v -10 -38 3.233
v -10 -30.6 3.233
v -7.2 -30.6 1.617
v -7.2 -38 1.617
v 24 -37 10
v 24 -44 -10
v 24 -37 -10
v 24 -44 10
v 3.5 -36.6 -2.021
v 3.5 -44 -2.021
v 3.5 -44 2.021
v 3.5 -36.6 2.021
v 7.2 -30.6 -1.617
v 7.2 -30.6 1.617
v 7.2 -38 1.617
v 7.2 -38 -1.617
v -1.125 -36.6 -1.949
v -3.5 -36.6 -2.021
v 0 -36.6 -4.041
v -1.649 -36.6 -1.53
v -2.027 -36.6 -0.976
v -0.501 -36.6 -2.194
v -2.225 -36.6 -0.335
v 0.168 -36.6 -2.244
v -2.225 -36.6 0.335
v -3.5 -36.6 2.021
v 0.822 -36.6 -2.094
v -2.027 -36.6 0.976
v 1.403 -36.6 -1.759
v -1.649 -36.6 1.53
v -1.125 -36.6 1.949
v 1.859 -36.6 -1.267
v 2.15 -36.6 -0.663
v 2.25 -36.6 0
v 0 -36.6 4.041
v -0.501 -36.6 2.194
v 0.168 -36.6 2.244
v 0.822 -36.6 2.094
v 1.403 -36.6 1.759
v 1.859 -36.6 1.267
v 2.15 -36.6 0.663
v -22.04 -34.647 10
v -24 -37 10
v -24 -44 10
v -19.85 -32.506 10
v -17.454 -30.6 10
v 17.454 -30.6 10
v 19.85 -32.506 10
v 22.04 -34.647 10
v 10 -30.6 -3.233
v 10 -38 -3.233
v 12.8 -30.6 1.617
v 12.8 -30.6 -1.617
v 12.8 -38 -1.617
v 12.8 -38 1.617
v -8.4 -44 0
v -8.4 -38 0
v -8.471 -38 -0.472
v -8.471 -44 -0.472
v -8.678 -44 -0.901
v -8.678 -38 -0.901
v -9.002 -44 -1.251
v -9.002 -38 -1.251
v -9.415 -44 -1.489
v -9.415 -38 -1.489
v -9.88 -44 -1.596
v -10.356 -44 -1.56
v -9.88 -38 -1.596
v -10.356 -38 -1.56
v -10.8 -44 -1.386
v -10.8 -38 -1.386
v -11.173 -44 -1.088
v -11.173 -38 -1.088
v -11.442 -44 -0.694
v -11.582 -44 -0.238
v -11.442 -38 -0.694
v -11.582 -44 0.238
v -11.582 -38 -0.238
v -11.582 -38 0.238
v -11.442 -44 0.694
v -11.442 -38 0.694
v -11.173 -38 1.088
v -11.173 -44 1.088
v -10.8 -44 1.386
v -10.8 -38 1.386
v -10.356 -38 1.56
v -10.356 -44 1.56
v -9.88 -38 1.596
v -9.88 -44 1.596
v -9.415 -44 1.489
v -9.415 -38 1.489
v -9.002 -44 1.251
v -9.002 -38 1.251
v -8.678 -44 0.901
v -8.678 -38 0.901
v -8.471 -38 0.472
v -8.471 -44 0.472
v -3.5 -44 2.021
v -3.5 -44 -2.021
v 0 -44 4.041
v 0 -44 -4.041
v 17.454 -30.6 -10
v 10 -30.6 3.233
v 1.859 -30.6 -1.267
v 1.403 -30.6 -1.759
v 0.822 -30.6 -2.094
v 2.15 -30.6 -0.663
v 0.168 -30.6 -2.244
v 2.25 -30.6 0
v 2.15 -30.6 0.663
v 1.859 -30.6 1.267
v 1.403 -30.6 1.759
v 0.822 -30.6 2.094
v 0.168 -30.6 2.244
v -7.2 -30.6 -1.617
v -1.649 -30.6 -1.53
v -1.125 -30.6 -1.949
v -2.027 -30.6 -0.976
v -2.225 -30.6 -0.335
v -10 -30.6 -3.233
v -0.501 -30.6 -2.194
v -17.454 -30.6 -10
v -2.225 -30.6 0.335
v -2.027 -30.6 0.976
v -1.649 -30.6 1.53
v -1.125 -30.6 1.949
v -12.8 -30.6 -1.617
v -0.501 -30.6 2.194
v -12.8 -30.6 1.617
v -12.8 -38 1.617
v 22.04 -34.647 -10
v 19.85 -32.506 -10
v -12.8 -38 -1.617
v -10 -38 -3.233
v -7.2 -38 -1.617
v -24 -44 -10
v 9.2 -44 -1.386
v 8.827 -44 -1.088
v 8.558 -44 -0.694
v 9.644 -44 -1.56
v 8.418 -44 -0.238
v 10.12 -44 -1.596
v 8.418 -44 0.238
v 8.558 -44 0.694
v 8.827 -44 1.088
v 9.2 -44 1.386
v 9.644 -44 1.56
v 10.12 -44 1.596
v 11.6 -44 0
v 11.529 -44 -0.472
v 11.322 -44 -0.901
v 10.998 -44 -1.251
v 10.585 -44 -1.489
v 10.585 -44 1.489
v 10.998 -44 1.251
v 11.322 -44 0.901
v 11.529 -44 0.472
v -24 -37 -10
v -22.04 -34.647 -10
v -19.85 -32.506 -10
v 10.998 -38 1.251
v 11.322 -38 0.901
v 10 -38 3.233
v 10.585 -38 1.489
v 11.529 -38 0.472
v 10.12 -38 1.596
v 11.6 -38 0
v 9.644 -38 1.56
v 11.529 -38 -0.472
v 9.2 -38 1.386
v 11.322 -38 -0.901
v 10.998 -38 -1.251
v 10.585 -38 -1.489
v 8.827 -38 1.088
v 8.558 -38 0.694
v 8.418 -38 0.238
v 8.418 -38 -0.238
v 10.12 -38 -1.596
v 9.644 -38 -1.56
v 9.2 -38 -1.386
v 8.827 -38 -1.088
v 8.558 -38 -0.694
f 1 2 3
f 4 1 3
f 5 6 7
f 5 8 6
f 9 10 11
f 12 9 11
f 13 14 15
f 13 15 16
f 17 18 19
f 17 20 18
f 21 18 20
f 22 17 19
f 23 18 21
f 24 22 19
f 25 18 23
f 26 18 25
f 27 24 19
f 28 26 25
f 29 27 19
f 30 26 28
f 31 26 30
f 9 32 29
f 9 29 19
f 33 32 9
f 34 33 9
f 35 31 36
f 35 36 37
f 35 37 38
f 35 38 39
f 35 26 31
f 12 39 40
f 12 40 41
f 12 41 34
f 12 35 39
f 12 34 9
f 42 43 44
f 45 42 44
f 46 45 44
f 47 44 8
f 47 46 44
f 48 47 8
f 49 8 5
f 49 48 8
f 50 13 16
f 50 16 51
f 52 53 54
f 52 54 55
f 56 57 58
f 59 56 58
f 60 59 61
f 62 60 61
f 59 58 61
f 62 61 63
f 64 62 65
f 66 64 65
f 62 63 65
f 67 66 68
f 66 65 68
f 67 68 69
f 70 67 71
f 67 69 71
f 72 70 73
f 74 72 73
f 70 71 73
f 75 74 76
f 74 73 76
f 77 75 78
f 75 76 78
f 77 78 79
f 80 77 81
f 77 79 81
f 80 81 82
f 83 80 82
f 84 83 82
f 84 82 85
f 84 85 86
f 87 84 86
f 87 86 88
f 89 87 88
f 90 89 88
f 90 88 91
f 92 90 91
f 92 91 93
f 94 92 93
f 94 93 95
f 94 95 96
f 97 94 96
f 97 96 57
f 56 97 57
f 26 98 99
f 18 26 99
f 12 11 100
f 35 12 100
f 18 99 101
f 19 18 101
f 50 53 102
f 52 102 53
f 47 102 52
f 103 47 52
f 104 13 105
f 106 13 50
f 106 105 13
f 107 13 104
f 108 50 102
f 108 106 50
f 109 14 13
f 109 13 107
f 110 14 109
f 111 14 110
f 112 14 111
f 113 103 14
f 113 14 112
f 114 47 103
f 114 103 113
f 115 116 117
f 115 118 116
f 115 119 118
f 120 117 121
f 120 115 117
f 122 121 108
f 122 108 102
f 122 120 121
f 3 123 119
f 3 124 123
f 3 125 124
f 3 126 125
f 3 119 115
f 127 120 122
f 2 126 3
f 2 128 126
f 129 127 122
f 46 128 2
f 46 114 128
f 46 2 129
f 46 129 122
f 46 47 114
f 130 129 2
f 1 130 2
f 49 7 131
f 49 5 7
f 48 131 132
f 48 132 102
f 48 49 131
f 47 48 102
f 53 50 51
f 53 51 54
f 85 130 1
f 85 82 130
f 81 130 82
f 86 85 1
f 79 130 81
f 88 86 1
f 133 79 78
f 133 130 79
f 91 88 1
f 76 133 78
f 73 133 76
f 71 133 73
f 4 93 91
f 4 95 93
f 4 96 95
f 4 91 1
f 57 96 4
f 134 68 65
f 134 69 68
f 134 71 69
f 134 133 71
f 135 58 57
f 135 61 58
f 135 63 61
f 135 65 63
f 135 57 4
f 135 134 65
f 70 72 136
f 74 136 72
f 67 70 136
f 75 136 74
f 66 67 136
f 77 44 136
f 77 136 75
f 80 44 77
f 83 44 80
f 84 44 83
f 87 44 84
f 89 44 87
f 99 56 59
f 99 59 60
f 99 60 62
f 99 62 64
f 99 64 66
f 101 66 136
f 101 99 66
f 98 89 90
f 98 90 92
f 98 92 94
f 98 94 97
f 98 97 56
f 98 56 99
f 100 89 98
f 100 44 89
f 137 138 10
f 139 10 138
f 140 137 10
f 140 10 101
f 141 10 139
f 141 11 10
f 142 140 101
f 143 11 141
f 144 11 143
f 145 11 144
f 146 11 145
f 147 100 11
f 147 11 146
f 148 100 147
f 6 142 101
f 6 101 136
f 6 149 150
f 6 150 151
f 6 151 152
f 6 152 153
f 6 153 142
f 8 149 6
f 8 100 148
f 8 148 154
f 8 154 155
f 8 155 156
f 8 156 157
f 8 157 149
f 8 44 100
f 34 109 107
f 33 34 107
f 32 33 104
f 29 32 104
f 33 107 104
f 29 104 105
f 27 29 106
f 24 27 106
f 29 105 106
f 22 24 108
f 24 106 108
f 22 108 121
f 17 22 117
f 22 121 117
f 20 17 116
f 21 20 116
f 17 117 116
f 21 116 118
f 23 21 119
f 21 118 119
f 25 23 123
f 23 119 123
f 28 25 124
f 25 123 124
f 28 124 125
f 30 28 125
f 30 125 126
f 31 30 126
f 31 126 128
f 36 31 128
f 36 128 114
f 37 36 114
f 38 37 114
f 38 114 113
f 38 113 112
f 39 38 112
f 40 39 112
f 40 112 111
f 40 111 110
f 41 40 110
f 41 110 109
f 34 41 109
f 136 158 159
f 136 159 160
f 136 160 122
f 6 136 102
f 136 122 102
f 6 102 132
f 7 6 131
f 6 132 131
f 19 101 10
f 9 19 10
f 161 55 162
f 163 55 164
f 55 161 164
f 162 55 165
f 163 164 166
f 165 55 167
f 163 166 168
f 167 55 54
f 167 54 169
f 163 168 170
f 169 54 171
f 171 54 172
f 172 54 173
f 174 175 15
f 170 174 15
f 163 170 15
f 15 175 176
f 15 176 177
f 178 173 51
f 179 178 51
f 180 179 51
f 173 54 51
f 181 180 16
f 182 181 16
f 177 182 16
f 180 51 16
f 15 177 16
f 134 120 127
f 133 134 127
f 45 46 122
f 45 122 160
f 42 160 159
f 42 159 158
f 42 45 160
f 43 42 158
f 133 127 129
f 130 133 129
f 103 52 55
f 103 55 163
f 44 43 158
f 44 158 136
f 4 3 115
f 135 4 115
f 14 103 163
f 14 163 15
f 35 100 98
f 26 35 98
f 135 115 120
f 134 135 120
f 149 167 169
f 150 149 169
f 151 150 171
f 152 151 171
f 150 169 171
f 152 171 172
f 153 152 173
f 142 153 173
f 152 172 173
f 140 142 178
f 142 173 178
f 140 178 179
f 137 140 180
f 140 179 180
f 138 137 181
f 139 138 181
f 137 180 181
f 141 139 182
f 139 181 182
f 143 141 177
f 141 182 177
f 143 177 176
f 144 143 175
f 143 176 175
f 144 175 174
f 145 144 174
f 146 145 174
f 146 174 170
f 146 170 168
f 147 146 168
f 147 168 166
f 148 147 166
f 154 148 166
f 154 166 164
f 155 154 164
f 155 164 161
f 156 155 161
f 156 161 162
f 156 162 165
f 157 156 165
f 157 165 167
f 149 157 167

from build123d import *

# Parameters (mm, degrees)
BOSS_EXTRUDE1_DEPTH = 10
CUT_EXTRUDE1_REACH  = 15.4
SKETCH2_R           = 2.25
SKETCH2_R_2         = 1.6
CUT_EXTRUDE2_DEPTH  = 7.4
CUT_EXTRUDE3_DEPTH  = 7.4


with BuildPart() as part:
    # Sketch1 → Boss-Extrude1 (new body, symmetric)
    with BuildSketch(Plane.XY):
        with BuildLine():
            Line((17.453939383, -30.6), (-17.453939383, -30.6))
            ThreePointArc((-17.453939383, -30.6), (-20.972536151, -33.54882923), (-24, -37))
            Line((-24, -37), (-24, -44))
            Line((-24, -44), (24, -44))
            Line((24, -44), (24, -37))
            ThreePointArc((24, -37), (20.972536151, -33.54882923), (17.453939383, -30.6))
        make_face()
    extrude(amount=BOSS_EXTRUDE1_DEPTH, both=True)

    # Sketch2 → Cut-Extrude1 (cut, up to next)
    with BuildSketch(Plane(origin=(0, -30.6, 0), x_dir=(1, 0, 0), z_dir=(0, 1, 0)), mode=Mode.PRIVATE) as cut_extrude1_sk1:
        Circle(SKETCH2_R)
    cut_extrude1_tool1 = extrude(cut_extrude1_sk1.sketch, amount=-CUT_EXTRUDE1_REACH, mode=Mode.PRIVATE) & part.part
    add(cut_extrude1_tool1.solids().sort_by_distance((0, -30.6, 0))[0], mode=Mode.SUBTRACT)
    # Sketch2 → Cut-Extrude1 (cut, up to next)
    with BuildSketch(Plane(origin=(0, -30.6, 0), x_dir=(1, 0, 0), z_dir=(0, 1, 0)), mode=Mode.PRIVATE) as cut_extrude1_sk2:
        with Locations((-10, 0)):
            Circle(SKETCH2_R_2)
    cut_extrude1_tool2 = extrude(cut_extrude1_sk2.sketch, amount=-CUT_EXTRUDE1_REACH, mode=Mode.PRIVATE) & part.part
    add(cut_extrude1_tool2.solids().sort_by_distance((-10, -30.6, 0))[0], mode=Mode.SUBTRACT)
    # Sketch2 → Cut-Extrude1 (cut, up to next)
    with BuildSketch(Plane(origin=(0, -30.6, 0), x_dir=(1, 0, 0), z_dir=(0, 1, 0)), mode=Mode.PRIVATE) as cut_extrude1_sk3:
        with Locations((10, 0)):
            Circle(SKETCH2_R_2)
    cut_extrude1_tool3 = extrude(cut_extrude1_sk3.sketch, amount=-CUT_EXTRUDE1_REACH, mode=Mode.PRIVATE) & part.part
    add(cut_extrude1_tool3.solids().sort_by_distance((10, -30.6, 0))[0], mode=Mode.SUBTRACT)

    # Sketch3 → Cut-Extrude2 (cut)
    with BuildSketch(Plane(origin=(0, -30.6, 0), x_dir=(1, 0, 0), z_dir=(0, 1, 0))):
        Polygon((-10, -3.233161507), (-7.2, -1.616580754), (-7.2, 1.616580754), (-10, 3.233161507), (-12.8, 1.616580754), (-12.8, -1.616580754), align=None)
        Polygon((10, -3.233161507), (7.2, -1.616580754), (7.2, 1.616580754), (10, 3.233161507), (12.8, 1.616580754), (12.8, -1.616580754), align=None)
    extrude(amount=-CUT_EXTRUDE2_DEPTH, mode=Mode.SUBTRACT)

    # Sketch4 → Cut-Extrude3 (cut)
    with BuildSketch(Plane.XZ.offset(44)):
        Polygon((0, -4.041451884), (3.5, -2.020725942), (3.5, 2.020725942), (0, 4.041451884), (-3.5, 2.020725942), (-3.5, -2.020725942), align=None)
    extrude(amount=-CUT_EXTRUDE3_DEPTH, mode=Mode.SUBTRACT)


solid = part.part
